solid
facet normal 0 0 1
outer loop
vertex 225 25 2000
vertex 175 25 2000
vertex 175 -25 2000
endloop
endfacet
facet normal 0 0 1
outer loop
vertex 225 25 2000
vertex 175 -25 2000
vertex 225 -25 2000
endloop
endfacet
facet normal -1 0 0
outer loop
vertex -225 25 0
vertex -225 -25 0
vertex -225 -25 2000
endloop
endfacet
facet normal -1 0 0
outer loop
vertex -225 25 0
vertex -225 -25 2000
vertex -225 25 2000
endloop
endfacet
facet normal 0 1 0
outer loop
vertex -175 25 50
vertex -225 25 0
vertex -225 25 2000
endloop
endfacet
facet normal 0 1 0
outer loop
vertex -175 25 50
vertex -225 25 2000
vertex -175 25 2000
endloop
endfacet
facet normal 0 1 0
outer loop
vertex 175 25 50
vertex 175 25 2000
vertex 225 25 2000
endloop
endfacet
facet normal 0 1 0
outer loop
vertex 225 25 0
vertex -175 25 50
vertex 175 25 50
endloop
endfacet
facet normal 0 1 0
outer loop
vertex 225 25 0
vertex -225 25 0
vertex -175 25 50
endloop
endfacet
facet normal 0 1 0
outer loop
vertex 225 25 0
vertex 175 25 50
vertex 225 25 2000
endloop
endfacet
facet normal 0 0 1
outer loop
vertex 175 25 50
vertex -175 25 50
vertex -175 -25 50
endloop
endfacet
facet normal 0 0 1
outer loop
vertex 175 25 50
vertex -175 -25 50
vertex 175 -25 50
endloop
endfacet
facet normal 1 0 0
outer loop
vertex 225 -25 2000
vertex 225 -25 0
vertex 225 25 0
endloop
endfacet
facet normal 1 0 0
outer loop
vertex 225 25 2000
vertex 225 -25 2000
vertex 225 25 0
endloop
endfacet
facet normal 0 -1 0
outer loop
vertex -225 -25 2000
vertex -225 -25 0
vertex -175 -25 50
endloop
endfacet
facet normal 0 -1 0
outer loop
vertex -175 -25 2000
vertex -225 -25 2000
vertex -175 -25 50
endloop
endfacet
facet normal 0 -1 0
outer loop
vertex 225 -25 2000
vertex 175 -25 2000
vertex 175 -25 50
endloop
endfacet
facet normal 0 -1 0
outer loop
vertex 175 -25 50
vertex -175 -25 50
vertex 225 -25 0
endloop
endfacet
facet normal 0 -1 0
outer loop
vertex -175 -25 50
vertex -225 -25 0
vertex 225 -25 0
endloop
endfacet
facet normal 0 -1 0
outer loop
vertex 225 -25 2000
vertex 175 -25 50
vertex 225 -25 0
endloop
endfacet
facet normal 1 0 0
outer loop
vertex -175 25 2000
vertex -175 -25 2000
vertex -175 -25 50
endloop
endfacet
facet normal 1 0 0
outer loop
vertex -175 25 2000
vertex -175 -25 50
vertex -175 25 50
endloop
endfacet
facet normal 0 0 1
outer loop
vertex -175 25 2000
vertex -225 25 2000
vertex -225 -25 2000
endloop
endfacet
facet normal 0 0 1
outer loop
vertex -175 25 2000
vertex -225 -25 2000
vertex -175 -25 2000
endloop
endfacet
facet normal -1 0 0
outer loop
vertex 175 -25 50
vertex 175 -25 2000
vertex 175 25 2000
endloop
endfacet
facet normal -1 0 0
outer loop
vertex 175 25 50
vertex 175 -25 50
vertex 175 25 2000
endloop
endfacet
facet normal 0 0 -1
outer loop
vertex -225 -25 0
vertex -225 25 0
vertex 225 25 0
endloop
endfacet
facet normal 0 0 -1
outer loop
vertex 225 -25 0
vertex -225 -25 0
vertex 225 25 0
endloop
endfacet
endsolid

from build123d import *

# Parameters (mm, degrees)
SKETCH_1_W      = 50
SKETCH_1_H      = 50
EXTRUDE_1_DEPTH = 2000
SKETCH_2_W      = 50
SKETCH_2_H      = 50
EXTRUDE_2_DEPTH = 2000
SKETCH_3_W      = 400
SKETCH_3_H      = 50
EXTRUDE_3_DEPTH = 50
SKETCH_4_W      = 400
SKETCH_4_H      = 50
EXTRUDE_4_DEPTH = 50
SKETCH_5_W      = 400
SKETCH_5_H      = 50
EXTRUDE_5_DEPTH = 50
SKETCH_6_W      = 400
SKETCH_6_H      = 50
EXTRUDE_6_DEPTH = 50
SKETCH_7_W      = 400
SKETCH_7_H      = 50
EXTRUDE_7_DEPTH = 50


with BuildPart() as part:
    # 草图1 → 凸台-拉伸1 (new body)
    with BuildSketch(Plane.XY):
        with Locations((-200, 0)):
            Rectangle(SKETCH_1_W, SKETCH_1_H)
    extrude(amount=EXTRUDE_1_DEPTH)



with BuildPart() as body_2:
    # 草图2 → 凸台-拉伸2 (new body)
    with BuildSketch(Plane.XY):
        with Locations((200, 0)):
            Rectangle(SKETCH_2_W, SKETCH_2_H)
    extrude(amount=EXTRUDE_2_DEPTH)


with BuildPart() as part_1:
    add(part.part)

    add(body_2.part)  # 凸台-拉伸3 merges body 2
    # 草图3 → 凸台-拉伸3 (add)
    with BuildSketch(Plane.XY):
        Rectangle(SKETCH_3_W, SKETCH_3_H)
    extrude(amount=EXTRUDE_3_DEPTH)

    # 草图4 → 凸台-拉伸4 (add)
    with BuildSketch(Plane.XY):
        Rectangle(SKETCH_4_W, SKETCH_4_H)
    extrude(amount=EXTRUDE_4_DEPTH)

    # 草图5 → 凸台-拉伸5 (add)
    with BuildSketch(Plane.XY):
        Rectangle(SKETCH_5_W, SKETCH_5_H)
    extrude(amount=EXTRUDE_5_DEPTH)

    # 草图6 → 凸台-拉伸6 (add)
    with BuildSketch(Plane.XY):
        Rectangle(SKETCH_6_W, SKETCH_6_H)
    extrude(amount=EXTRUDE_6_DEPTH)

    # 草图7 → 凸台-拉伸7 (add)
    with BuildSketch(Plane.XY):
        Rectangle(SKETCH_7_W, SKETCH_7_H)
    extrude(amount=EXTRUDE_7_DEPTH)


solid = part_1.part
